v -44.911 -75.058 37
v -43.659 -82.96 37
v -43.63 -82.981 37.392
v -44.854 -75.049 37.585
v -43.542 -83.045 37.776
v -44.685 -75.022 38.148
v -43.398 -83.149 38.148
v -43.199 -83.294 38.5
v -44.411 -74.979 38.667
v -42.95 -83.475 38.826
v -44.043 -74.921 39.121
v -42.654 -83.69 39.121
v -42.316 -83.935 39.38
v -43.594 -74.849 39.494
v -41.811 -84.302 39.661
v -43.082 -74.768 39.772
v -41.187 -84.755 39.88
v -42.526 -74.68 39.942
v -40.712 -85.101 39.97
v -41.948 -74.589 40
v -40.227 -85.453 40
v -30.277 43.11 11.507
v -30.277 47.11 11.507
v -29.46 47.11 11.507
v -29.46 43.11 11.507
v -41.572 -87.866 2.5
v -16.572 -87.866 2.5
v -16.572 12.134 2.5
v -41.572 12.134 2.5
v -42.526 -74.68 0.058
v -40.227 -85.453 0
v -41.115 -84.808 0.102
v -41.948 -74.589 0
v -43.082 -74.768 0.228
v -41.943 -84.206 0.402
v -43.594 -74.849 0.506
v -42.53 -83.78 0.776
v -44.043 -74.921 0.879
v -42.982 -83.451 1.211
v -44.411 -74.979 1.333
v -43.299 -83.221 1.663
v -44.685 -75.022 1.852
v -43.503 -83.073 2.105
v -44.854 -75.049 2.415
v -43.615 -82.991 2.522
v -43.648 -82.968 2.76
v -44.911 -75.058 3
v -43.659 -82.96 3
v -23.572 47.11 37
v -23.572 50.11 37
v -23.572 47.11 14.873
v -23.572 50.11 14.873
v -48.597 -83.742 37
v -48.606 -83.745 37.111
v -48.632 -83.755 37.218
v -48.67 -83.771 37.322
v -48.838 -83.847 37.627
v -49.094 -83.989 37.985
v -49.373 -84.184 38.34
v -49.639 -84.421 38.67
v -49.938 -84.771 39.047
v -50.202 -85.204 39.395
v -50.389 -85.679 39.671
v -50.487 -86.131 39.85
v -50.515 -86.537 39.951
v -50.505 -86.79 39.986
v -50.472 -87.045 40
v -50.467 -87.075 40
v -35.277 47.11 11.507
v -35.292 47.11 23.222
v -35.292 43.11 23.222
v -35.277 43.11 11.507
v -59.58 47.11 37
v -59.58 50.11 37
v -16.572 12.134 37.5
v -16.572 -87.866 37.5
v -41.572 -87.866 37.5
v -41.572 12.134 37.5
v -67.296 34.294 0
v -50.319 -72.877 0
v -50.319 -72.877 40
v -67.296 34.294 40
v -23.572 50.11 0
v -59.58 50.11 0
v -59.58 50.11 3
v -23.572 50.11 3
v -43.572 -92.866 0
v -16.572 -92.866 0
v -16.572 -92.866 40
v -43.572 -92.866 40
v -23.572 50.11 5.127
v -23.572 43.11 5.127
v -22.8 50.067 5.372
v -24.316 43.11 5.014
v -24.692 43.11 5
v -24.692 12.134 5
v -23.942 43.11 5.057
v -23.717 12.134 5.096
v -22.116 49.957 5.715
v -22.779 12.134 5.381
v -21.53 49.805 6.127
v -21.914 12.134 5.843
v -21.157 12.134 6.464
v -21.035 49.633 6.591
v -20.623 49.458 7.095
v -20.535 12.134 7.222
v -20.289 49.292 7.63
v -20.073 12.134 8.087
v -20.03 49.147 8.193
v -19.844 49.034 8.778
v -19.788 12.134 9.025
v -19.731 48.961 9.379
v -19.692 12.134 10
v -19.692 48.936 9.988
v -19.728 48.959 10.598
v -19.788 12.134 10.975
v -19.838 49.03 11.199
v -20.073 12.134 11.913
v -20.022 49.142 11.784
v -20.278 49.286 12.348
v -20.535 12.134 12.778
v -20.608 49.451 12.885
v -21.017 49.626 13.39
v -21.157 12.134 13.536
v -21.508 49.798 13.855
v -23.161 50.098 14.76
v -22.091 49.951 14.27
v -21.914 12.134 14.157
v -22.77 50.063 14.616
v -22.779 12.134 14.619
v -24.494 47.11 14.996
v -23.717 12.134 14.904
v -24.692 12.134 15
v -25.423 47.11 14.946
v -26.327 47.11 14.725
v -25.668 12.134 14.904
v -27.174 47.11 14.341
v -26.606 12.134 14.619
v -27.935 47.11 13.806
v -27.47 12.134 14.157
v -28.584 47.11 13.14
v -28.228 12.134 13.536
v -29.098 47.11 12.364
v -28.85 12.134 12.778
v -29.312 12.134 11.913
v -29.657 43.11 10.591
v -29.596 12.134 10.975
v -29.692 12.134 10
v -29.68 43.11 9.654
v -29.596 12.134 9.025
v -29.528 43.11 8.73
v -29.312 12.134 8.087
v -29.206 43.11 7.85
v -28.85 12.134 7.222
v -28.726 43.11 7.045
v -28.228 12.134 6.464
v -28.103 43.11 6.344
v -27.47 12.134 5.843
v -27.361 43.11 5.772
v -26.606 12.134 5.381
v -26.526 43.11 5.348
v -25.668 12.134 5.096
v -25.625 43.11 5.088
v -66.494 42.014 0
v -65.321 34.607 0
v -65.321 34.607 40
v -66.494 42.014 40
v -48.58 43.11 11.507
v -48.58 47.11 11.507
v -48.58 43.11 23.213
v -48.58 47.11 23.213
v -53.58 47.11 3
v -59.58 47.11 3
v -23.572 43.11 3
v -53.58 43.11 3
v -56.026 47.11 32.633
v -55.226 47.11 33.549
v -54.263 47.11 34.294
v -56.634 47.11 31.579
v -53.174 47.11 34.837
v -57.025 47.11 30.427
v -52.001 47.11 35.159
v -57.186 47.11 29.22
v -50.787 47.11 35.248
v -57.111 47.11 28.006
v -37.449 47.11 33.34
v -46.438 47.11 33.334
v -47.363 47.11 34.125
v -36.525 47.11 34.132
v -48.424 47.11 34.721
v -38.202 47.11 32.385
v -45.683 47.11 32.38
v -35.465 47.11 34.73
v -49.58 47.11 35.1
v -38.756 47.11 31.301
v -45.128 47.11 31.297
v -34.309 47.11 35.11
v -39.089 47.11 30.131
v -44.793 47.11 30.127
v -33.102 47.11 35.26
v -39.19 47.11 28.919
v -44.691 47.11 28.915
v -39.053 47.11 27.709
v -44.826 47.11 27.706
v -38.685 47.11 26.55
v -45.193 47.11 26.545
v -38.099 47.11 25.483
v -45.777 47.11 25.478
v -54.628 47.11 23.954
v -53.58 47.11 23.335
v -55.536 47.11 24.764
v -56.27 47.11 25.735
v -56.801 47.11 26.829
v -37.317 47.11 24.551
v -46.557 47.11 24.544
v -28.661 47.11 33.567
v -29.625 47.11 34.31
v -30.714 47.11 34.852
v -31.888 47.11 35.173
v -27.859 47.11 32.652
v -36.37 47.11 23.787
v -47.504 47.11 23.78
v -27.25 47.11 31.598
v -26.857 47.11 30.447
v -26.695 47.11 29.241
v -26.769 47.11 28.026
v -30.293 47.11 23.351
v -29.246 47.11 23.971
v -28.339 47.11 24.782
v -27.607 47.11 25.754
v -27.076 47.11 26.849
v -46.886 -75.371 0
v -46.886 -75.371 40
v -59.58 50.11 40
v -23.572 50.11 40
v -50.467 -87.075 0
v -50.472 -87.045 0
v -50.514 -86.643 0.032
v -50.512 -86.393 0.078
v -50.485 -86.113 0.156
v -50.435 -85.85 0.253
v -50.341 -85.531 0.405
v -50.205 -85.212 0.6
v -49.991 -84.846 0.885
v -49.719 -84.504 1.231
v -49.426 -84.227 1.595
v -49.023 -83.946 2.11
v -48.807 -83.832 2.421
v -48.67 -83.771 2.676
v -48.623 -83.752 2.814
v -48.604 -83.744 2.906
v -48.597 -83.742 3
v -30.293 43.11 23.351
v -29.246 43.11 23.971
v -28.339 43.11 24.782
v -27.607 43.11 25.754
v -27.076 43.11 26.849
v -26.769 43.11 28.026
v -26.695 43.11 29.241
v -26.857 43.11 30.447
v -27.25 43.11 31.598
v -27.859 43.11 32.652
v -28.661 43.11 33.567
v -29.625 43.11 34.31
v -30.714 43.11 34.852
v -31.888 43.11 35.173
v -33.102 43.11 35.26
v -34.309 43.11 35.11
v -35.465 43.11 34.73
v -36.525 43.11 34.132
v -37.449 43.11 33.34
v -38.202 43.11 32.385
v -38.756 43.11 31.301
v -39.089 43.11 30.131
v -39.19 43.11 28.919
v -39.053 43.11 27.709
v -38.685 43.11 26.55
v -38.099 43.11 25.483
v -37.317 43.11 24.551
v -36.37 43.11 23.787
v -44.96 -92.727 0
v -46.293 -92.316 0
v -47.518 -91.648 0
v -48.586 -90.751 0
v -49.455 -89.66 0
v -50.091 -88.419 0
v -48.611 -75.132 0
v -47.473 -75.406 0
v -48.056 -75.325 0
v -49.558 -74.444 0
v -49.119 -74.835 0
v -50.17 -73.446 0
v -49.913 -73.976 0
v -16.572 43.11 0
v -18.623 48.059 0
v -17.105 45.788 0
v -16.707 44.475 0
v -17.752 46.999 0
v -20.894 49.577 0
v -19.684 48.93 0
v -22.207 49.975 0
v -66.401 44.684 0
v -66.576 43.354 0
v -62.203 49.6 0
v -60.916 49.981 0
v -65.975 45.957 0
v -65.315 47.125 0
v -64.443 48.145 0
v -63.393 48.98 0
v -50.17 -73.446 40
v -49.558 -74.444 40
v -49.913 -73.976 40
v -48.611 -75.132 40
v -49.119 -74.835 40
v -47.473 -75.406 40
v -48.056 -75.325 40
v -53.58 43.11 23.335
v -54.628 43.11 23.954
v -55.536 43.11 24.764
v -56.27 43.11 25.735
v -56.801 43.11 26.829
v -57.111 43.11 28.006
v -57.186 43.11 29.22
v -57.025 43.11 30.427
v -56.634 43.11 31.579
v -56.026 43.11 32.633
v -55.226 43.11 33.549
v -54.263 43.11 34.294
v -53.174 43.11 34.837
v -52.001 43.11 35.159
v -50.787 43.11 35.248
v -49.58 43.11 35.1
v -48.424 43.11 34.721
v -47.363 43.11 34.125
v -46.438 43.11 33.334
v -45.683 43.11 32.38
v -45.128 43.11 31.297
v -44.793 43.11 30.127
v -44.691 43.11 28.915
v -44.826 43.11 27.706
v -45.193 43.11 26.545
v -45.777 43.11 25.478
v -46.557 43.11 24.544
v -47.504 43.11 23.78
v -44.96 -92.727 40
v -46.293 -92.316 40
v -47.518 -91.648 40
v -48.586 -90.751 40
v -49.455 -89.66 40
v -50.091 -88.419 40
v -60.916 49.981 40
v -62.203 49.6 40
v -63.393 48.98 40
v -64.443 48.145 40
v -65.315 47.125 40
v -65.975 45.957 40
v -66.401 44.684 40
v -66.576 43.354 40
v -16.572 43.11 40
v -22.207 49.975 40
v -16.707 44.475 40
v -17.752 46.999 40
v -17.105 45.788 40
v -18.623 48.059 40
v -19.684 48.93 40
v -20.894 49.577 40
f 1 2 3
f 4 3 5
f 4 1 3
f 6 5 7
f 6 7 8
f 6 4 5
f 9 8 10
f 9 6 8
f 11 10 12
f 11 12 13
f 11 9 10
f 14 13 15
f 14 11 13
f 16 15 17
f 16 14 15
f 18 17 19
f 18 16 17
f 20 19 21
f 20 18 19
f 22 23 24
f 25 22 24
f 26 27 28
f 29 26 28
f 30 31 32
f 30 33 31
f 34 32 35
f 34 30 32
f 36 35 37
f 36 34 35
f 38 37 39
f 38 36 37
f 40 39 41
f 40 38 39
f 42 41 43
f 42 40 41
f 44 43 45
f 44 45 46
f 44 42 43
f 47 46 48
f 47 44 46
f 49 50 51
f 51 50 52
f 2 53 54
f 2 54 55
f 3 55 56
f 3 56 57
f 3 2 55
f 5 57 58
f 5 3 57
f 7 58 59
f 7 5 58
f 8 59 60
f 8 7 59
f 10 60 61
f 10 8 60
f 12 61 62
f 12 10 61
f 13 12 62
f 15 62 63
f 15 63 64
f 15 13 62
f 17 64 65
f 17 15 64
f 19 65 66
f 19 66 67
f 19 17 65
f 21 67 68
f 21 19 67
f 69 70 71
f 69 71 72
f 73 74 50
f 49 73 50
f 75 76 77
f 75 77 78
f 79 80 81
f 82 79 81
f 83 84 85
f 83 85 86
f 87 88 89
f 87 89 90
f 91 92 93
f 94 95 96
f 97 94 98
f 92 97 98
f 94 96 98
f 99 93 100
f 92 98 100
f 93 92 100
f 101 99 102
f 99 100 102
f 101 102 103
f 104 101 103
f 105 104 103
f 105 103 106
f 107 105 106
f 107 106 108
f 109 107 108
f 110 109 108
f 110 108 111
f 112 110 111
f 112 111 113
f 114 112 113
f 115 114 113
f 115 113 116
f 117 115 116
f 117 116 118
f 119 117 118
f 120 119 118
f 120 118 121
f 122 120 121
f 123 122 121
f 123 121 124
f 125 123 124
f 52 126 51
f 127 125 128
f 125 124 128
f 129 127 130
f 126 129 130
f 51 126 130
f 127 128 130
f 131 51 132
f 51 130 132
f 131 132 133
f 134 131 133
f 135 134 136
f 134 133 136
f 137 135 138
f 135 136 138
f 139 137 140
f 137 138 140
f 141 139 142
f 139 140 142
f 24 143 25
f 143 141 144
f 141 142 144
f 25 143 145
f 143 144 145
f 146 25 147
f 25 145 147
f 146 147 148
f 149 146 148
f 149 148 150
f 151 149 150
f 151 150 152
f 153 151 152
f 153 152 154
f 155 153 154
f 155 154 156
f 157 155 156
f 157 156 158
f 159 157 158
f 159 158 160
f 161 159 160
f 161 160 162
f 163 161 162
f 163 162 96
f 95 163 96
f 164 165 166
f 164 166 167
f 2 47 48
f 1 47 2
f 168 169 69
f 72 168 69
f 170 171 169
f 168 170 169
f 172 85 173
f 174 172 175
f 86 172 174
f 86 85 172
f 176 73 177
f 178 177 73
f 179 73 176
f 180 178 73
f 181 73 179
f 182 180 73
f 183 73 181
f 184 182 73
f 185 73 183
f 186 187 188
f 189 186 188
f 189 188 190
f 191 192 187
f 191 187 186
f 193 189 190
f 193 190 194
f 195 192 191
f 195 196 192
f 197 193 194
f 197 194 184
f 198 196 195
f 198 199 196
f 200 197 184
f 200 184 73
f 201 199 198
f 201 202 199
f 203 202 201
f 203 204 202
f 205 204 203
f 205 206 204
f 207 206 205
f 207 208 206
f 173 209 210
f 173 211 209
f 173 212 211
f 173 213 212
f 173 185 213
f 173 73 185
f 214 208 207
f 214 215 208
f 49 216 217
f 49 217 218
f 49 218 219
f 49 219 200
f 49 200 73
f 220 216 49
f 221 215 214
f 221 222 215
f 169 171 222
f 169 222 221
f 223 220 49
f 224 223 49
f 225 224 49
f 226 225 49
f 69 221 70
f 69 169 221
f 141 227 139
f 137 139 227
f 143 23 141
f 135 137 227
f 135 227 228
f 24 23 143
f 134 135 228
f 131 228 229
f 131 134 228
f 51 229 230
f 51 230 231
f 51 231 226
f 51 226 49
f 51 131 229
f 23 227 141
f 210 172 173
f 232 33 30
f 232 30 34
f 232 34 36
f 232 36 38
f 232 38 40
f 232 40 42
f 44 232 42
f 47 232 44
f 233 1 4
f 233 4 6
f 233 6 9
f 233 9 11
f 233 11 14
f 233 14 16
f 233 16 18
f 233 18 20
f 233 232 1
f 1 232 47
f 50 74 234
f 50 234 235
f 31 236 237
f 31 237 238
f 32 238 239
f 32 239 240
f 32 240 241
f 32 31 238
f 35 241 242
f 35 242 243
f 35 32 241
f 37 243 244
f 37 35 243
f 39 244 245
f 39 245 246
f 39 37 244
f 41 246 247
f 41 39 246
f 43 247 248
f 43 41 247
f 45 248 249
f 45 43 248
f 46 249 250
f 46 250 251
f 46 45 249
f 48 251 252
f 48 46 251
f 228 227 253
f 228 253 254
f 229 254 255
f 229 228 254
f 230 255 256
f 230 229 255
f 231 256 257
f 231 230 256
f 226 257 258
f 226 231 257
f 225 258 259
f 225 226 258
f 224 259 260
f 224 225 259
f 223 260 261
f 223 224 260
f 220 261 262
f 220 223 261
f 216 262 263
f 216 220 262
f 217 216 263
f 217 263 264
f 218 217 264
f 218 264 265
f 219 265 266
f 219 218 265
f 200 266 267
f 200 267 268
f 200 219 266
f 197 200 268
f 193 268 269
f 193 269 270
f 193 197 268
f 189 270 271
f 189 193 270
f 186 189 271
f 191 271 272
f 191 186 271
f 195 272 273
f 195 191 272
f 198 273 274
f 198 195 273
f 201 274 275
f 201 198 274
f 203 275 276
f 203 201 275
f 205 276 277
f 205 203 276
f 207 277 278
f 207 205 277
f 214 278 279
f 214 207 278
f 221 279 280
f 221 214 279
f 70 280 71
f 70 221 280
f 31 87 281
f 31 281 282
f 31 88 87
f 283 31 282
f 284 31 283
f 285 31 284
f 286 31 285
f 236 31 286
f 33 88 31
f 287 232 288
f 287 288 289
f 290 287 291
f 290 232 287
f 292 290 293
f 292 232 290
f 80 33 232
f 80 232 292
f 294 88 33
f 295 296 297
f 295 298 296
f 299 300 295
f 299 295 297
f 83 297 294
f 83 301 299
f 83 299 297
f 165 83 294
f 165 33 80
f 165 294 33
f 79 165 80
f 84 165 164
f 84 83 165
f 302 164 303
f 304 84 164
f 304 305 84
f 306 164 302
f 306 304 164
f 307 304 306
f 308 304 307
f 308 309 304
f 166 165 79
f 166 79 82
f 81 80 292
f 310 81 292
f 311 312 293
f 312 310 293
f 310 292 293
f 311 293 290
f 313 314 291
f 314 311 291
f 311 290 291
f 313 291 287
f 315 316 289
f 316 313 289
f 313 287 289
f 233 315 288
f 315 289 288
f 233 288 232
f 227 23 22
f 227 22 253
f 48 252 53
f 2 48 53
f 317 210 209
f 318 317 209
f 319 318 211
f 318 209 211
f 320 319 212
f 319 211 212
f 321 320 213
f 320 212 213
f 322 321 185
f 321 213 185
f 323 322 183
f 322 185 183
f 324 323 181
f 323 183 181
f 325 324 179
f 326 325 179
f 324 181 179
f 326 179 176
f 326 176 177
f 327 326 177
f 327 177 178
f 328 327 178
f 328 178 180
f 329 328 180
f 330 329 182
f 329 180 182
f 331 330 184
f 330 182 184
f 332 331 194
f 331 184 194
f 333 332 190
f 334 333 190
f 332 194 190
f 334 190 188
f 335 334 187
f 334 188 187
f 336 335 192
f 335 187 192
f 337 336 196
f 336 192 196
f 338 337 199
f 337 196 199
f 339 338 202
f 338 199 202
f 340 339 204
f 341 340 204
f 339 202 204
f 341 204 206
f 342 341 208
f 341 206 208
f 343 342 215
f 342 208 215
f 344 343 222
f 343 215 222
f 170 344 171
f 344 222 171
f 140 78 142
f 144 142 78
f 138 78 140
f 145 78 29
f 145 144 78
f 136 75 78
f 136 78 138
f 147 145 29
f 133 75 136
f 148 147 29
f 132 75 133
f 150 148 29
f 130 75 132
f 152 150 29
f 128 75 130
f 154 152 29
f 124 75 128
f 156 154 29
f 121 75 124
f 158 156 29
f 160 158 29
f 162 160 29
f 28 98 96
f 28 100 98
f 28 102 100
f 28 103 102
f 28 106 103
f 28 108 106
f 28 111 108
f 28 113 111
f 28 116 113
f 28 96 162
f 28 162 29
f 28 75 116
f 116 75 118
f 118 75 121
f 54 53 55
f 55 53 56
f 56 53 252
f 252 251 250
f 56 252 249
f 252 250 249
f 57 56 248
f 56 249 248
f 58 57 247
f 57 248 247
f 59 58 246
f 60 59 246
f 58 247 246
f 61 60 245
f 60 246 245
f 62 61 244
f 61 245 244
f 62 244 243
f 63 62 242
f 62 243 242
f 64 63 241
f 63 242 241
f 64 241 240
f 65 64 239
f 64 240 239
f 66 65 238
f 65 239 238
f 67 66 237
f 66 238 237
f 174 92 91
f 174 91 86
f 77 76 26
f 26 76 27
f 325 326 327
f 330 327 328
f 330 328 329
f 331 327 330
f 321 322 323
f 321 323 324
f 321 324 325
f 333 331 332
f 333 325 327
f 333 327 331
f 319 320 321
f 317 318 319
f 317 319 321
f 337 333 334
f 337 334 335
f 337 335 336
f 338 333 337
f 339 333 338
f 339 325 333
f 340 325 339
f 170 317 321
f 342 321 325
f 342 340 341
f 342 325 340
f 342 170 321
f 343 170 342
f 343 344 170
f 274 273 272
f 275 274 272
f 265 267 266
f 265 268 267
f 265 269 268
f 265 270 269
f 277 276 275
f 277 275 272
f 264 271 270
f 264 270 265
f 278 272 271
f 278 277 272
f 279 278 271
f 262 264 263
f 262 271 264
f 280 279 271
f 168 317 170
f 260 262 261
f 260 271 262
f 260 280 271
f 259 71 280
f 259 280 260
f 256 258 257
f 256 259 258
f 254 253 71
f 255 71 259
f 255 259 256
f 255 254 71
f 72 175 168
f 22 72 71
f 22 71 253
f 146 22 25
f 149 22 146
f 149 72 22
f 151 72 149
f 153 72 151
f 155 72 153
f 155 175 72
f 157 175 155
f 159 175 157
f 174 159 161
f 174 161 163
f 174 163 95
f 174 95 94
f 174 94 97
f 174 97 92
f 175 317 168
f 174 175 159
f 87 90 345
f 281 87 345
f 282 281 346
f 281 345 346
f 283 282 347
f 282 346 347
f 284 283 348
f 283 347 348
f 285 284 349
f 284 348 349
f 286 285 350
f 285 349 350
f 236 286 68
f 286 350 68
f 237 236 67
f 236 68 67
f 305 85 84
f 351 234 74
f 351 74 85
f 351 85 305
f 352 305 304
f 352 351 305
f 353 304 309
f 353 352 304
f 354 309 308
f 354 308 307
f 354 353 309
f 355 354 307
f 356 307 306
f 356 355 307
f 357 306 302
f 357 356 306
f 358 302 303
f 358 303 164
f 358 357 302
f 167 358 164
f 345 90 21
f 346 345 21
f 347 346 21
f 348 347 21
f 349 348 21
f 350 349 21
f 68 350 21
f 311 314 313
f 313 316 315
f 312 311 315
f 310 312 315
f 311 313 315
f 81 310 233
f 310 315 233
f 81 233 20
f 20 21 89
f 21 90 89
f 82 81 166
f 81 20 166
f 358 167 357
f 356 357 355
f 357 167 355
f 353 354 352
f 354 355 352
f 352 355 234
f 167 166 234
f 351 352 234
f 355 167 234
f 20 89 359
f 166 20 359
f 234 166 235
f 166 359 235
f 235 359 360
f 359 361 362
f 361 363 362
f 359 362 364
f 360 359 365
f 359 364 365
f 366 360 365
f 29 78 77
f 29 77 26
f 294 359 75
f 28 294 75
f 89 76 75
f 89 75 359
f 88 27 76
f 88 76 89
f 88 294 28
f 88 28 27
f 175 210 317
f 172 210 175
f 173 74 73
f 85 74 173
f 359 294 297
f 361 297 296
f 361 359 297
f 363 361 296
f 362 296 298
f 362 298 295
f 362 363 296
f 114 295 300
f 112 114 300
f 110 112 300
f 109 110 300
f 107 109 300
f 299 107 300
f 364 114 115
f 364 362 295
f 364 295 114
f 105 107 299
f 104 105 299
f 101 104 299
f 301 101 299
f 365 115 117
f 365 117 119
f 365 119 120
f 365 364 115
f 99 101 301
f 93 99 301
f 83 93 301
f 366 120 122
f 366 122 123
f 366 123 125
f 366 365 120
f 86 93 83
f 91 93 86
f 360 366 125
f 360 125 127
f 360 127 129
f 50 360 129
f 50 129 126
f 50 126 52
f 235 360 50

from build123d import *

# Parameters (mm, degrees)
BOSS_EXTRUDE1_DEPTH = 40
FILLET3_R           = 7
FILLET4_R           = 7
FILLET5_R           = 7
SKETCH8_W           = 40
SKETCH8_H           = 119.824449513
BOSS_EXTRUDE2_DEPTH = 2
SKETCH9_W           = 40
SKETCH9_H           = 8
CUT_EXTRUDE6_DEPTH  = 5
FILLET6_R           = 3
FILLET7_R           = 3
SKETCH10_W          = 35
SKETCH10_H          = 100
CUT_EXTRUDE7_DEPTH  = 25
SKETCH11_R          = 5
CUT_EXTRUDE8_DEPTH  = 40
SKETCH12_W          = 36.007885592
SKETCH12_H          = 34
CUT_EXTRUDE9_DEPTH  = 3
CUT_EXTRUDE10_DEPTH = 4
SKETCH15_W          = 30.007885592
SKETCH15_H          = 8.507444754
CUT_EXTRUDE12_DEPTH = 4


with BuildPart() as part:
    # Sketch1 → Boss-Extrude1 (new body)
    with BuildSketch(Plane.XY):
        Polygon((-46.572492334, -83.741881942), (-67.776571631, 50.109646847), (-16.572492334, 50.109646847), (-16.572492334, -92.866074504), (-50.572492334, -92.866074504), (-50.572492334, -83.741881942), align=None)
    extrude(amount=BOSS_EXTRUDE1_DEPTH)

    # Fillet3
    fillet3_edges = [part.edges().sort_by_distance(p)[0] for p in [
        (-50.572492334, -92.866074504, 20),
    ]]
    fillet(fillet3_edges, radius=FILLET3_R)

    # Fillet4
    fillet4_edges = [part.edges().sort_by_distance(p)[0] for p in [
        (-16.572492334, 50.109646847, 20),
    ]]
    fillet(fillet4_edges, radius=FILLET4_R)

    # Fillet5
    fillet5_edges = [part.edges().sort_by_distance(p)[0] for p in [
        (-67.776571631, 50.109646847, 20),
    ]]
    fillet(fillet5_edges, radius=FILLET5_R)

    # Sketch8 → Boss-Extrude2 (add)
    with BuildSketch(Plane(origin=(-58.373554794, -9.247242044, 0), x_dir=(0, 0, 1), z_dir=(-0.987683688709488, -0.15646383306444783, 0))):
        with Locations((20, -15.511355434)):
            Rectangle(SKETCH8_W, SKETCH8_H)
    extrude(amount=BOSS_EXTRUDE2_DEPTH)

    # Sketch9 → Cut-Extrude6 (cut)
    with BuildSketch(Plane(origin=(-60.348922171, -9.56016971, 0), x_dir=(0, 0, 1), z_dir=(-0.987683688709488, -0.1564638330644479, 0))):
        with Locations((20, -71.106750349)):
            Rectangle(SKETCH9_W, SKETCH9_H)
    extrude(amount=-CUT_EXTRUDE6_DEPTH, mode=Mode.SUBTRACT)

    # Fillet6
    # the kernel refuses this fillet: 3 mm, written as the material it takes off along each edge
    with BuildSketch(Plane(origin=(-50.572492334, -83.741881942, -8.262362342), x_dir=(1, 0, 0), z_dir=(0, 0, 1))) as fillet6_piece_1:
        with BuildLine():
            CenterArc((3.057167778, -2.798042747), FILLET6_R, 111.143346589, 78.555093673)
            Line((0.100043612, -3.303430385), (-0.195668805, -3.353969149))
            ThreePointArc((-0.195668805, -3.353969149), (-0.3, -2.124192562), (-0.3, 0))
            Line((-0.3, 0), (0, 0.3))
            ThreePointArc((0, 0.3), (0.987530106, 0.3), (1.866849455, 0.279804275))
            Line((1.866849455, 0.279804275), (1.975060211, 0))
        make_face()
    extrude(amount=56.524724683, mode=Mode.SUBTRACT)
    with BuildSketch(Plane(origin=(-49.849142787, -75.840412432, -7.5), x_dir=(-0.15646383306444783, 0.9876836887094879, 0), z_dir=(0, 0, 1))) as fillet6_piece_2:
        with BuildLine():
            CenterArc((FILLET6_R, -FILLET6_R), FILLET6_R, 90, 90)
            Line((0, -FILLET6_R), (-FILLET6_R * 0.02, -FILLET6_R))
            Line((-FILLET6_R * 0.02, -FILLET6_R), (-FILLET6_R * 0.02, FILLET6_R * 0.02))
            Line((-FILLET6_R * 0.02, FILLET6_R * 0.02), (FILLET6_R, FILLET6_R * 0.02))
            Line((FILLET6_R, FILLET6_R * 0.02), (FILLET6_R, 0))
        make_face()
    extrude(amount=55, mode=Mode.SUBTRACT)

    # Fillet7
    fillet7_edges = [part.edges().sort_by_distance(p)[0] for p in [
        (-44.284869011, -79.008828021, 0),
        (-44.284869011, -79.008828021, 40),
        (-46.128222901, -83.350722359, 0),
        (-46.128222901, -83.350722359, 40),
    ]]
    fillet(fillet7_edges, radius=FILLET7_R)

    # Sketch10 → Cut-Extrude7 (cut)
    with BuildSketch(Plane(origin=(-16.572492334, 0, 0), x_dir=(0, 0, -1), z_dir=(1, 0, 0))):
        with Locations((-20, -37.866074504)):
            Rectangle(SKETCH10_W, SKETCH10_H)
    extrude(amount=-CUT_EXTRUDE7_DEPTH, mode=Mode.SUBTRACT)

    # Sketch11 → Cut-Extrude8 (cut)
    with BuildSketch(Plane.XZ.offset(-12.133925496)):
        with Locations(Location((-24.692244137, 10, 0), (0, 0, 270))):
            Circle(SKETCH11_R)
    extrude(amount=-CUT_EXTRUDE8_DEPTH, mode=Mode.SUBTRACT)

    # Sketch12 → Cut-Extrude9 (cut)
    with BuildSketch(Plane(origin=(0, 50.109646847, 0), x_dir=(1, 0, 0), z_dir=(0, 1, 0))):
        with Locations((-41.57643513, -20)):
            Rectangle(SKETCH12_W, SKETCH12_H)
    extrude(amount=-CUT_EXTRUDE9_DEPTH, mode=Mode.SUBTRACT)

    # Sketch14 → Cut-Extrude10 (cut)
    with BuildSketch(Plane(origin=(0, 47.109646847, 0), x_dir=(1, 0, 0), z_dir=(0, 1, 0))):
        with BuildLine():
            Line((-48.580377926, -23.212665104), (-48.580377926, -9))
            Line((-48.580377926, -9), (-53.580377926, -9))
            Line((-53.580377926, -9), (-53.580377926, -23.334974507))
            ThreePointArc((-53.580377926, -23.334974507), (-50.787463759, -35.24813089), (-48.580377926, -23.212665104))
        make_face()
        with BuildLine():
            Line((-35.273431744, -9.008916267), (-30.273436234, -9.015616726))
            Line((-30.273436234, -9.015616726), (-30.292646413, -23.350578361))
            ThreePointArc((-30.292646413, -23.350578361), (-33.101522793, -35.259981286), (-35.292478017, -23.22156861))
            Line((-35.292478017, -23.22156861), (-35.273431744, -9.008916267))
        make_face()
    extrude(amount=-CUT_EXTRUDE10_DEPTH, mode=Mode.SUBTRACT)

    # Sketch15 → Cut-Extrude12 (cut)
    with BuildSketch(Plane(origin=(0, 47.109646847, 0), x_dir=(1, 0, 0), z_dir=(0, 1, 0))):
        with Locations((-38.57643513, -7.253722377)):
            Rectangle(SKETCH15_W, SKETCH15_H)
    extrude(amount=-CUT_EXTRUDE12_DEPTH, mode=Mode.SUBTRACT)


solid = part.part
